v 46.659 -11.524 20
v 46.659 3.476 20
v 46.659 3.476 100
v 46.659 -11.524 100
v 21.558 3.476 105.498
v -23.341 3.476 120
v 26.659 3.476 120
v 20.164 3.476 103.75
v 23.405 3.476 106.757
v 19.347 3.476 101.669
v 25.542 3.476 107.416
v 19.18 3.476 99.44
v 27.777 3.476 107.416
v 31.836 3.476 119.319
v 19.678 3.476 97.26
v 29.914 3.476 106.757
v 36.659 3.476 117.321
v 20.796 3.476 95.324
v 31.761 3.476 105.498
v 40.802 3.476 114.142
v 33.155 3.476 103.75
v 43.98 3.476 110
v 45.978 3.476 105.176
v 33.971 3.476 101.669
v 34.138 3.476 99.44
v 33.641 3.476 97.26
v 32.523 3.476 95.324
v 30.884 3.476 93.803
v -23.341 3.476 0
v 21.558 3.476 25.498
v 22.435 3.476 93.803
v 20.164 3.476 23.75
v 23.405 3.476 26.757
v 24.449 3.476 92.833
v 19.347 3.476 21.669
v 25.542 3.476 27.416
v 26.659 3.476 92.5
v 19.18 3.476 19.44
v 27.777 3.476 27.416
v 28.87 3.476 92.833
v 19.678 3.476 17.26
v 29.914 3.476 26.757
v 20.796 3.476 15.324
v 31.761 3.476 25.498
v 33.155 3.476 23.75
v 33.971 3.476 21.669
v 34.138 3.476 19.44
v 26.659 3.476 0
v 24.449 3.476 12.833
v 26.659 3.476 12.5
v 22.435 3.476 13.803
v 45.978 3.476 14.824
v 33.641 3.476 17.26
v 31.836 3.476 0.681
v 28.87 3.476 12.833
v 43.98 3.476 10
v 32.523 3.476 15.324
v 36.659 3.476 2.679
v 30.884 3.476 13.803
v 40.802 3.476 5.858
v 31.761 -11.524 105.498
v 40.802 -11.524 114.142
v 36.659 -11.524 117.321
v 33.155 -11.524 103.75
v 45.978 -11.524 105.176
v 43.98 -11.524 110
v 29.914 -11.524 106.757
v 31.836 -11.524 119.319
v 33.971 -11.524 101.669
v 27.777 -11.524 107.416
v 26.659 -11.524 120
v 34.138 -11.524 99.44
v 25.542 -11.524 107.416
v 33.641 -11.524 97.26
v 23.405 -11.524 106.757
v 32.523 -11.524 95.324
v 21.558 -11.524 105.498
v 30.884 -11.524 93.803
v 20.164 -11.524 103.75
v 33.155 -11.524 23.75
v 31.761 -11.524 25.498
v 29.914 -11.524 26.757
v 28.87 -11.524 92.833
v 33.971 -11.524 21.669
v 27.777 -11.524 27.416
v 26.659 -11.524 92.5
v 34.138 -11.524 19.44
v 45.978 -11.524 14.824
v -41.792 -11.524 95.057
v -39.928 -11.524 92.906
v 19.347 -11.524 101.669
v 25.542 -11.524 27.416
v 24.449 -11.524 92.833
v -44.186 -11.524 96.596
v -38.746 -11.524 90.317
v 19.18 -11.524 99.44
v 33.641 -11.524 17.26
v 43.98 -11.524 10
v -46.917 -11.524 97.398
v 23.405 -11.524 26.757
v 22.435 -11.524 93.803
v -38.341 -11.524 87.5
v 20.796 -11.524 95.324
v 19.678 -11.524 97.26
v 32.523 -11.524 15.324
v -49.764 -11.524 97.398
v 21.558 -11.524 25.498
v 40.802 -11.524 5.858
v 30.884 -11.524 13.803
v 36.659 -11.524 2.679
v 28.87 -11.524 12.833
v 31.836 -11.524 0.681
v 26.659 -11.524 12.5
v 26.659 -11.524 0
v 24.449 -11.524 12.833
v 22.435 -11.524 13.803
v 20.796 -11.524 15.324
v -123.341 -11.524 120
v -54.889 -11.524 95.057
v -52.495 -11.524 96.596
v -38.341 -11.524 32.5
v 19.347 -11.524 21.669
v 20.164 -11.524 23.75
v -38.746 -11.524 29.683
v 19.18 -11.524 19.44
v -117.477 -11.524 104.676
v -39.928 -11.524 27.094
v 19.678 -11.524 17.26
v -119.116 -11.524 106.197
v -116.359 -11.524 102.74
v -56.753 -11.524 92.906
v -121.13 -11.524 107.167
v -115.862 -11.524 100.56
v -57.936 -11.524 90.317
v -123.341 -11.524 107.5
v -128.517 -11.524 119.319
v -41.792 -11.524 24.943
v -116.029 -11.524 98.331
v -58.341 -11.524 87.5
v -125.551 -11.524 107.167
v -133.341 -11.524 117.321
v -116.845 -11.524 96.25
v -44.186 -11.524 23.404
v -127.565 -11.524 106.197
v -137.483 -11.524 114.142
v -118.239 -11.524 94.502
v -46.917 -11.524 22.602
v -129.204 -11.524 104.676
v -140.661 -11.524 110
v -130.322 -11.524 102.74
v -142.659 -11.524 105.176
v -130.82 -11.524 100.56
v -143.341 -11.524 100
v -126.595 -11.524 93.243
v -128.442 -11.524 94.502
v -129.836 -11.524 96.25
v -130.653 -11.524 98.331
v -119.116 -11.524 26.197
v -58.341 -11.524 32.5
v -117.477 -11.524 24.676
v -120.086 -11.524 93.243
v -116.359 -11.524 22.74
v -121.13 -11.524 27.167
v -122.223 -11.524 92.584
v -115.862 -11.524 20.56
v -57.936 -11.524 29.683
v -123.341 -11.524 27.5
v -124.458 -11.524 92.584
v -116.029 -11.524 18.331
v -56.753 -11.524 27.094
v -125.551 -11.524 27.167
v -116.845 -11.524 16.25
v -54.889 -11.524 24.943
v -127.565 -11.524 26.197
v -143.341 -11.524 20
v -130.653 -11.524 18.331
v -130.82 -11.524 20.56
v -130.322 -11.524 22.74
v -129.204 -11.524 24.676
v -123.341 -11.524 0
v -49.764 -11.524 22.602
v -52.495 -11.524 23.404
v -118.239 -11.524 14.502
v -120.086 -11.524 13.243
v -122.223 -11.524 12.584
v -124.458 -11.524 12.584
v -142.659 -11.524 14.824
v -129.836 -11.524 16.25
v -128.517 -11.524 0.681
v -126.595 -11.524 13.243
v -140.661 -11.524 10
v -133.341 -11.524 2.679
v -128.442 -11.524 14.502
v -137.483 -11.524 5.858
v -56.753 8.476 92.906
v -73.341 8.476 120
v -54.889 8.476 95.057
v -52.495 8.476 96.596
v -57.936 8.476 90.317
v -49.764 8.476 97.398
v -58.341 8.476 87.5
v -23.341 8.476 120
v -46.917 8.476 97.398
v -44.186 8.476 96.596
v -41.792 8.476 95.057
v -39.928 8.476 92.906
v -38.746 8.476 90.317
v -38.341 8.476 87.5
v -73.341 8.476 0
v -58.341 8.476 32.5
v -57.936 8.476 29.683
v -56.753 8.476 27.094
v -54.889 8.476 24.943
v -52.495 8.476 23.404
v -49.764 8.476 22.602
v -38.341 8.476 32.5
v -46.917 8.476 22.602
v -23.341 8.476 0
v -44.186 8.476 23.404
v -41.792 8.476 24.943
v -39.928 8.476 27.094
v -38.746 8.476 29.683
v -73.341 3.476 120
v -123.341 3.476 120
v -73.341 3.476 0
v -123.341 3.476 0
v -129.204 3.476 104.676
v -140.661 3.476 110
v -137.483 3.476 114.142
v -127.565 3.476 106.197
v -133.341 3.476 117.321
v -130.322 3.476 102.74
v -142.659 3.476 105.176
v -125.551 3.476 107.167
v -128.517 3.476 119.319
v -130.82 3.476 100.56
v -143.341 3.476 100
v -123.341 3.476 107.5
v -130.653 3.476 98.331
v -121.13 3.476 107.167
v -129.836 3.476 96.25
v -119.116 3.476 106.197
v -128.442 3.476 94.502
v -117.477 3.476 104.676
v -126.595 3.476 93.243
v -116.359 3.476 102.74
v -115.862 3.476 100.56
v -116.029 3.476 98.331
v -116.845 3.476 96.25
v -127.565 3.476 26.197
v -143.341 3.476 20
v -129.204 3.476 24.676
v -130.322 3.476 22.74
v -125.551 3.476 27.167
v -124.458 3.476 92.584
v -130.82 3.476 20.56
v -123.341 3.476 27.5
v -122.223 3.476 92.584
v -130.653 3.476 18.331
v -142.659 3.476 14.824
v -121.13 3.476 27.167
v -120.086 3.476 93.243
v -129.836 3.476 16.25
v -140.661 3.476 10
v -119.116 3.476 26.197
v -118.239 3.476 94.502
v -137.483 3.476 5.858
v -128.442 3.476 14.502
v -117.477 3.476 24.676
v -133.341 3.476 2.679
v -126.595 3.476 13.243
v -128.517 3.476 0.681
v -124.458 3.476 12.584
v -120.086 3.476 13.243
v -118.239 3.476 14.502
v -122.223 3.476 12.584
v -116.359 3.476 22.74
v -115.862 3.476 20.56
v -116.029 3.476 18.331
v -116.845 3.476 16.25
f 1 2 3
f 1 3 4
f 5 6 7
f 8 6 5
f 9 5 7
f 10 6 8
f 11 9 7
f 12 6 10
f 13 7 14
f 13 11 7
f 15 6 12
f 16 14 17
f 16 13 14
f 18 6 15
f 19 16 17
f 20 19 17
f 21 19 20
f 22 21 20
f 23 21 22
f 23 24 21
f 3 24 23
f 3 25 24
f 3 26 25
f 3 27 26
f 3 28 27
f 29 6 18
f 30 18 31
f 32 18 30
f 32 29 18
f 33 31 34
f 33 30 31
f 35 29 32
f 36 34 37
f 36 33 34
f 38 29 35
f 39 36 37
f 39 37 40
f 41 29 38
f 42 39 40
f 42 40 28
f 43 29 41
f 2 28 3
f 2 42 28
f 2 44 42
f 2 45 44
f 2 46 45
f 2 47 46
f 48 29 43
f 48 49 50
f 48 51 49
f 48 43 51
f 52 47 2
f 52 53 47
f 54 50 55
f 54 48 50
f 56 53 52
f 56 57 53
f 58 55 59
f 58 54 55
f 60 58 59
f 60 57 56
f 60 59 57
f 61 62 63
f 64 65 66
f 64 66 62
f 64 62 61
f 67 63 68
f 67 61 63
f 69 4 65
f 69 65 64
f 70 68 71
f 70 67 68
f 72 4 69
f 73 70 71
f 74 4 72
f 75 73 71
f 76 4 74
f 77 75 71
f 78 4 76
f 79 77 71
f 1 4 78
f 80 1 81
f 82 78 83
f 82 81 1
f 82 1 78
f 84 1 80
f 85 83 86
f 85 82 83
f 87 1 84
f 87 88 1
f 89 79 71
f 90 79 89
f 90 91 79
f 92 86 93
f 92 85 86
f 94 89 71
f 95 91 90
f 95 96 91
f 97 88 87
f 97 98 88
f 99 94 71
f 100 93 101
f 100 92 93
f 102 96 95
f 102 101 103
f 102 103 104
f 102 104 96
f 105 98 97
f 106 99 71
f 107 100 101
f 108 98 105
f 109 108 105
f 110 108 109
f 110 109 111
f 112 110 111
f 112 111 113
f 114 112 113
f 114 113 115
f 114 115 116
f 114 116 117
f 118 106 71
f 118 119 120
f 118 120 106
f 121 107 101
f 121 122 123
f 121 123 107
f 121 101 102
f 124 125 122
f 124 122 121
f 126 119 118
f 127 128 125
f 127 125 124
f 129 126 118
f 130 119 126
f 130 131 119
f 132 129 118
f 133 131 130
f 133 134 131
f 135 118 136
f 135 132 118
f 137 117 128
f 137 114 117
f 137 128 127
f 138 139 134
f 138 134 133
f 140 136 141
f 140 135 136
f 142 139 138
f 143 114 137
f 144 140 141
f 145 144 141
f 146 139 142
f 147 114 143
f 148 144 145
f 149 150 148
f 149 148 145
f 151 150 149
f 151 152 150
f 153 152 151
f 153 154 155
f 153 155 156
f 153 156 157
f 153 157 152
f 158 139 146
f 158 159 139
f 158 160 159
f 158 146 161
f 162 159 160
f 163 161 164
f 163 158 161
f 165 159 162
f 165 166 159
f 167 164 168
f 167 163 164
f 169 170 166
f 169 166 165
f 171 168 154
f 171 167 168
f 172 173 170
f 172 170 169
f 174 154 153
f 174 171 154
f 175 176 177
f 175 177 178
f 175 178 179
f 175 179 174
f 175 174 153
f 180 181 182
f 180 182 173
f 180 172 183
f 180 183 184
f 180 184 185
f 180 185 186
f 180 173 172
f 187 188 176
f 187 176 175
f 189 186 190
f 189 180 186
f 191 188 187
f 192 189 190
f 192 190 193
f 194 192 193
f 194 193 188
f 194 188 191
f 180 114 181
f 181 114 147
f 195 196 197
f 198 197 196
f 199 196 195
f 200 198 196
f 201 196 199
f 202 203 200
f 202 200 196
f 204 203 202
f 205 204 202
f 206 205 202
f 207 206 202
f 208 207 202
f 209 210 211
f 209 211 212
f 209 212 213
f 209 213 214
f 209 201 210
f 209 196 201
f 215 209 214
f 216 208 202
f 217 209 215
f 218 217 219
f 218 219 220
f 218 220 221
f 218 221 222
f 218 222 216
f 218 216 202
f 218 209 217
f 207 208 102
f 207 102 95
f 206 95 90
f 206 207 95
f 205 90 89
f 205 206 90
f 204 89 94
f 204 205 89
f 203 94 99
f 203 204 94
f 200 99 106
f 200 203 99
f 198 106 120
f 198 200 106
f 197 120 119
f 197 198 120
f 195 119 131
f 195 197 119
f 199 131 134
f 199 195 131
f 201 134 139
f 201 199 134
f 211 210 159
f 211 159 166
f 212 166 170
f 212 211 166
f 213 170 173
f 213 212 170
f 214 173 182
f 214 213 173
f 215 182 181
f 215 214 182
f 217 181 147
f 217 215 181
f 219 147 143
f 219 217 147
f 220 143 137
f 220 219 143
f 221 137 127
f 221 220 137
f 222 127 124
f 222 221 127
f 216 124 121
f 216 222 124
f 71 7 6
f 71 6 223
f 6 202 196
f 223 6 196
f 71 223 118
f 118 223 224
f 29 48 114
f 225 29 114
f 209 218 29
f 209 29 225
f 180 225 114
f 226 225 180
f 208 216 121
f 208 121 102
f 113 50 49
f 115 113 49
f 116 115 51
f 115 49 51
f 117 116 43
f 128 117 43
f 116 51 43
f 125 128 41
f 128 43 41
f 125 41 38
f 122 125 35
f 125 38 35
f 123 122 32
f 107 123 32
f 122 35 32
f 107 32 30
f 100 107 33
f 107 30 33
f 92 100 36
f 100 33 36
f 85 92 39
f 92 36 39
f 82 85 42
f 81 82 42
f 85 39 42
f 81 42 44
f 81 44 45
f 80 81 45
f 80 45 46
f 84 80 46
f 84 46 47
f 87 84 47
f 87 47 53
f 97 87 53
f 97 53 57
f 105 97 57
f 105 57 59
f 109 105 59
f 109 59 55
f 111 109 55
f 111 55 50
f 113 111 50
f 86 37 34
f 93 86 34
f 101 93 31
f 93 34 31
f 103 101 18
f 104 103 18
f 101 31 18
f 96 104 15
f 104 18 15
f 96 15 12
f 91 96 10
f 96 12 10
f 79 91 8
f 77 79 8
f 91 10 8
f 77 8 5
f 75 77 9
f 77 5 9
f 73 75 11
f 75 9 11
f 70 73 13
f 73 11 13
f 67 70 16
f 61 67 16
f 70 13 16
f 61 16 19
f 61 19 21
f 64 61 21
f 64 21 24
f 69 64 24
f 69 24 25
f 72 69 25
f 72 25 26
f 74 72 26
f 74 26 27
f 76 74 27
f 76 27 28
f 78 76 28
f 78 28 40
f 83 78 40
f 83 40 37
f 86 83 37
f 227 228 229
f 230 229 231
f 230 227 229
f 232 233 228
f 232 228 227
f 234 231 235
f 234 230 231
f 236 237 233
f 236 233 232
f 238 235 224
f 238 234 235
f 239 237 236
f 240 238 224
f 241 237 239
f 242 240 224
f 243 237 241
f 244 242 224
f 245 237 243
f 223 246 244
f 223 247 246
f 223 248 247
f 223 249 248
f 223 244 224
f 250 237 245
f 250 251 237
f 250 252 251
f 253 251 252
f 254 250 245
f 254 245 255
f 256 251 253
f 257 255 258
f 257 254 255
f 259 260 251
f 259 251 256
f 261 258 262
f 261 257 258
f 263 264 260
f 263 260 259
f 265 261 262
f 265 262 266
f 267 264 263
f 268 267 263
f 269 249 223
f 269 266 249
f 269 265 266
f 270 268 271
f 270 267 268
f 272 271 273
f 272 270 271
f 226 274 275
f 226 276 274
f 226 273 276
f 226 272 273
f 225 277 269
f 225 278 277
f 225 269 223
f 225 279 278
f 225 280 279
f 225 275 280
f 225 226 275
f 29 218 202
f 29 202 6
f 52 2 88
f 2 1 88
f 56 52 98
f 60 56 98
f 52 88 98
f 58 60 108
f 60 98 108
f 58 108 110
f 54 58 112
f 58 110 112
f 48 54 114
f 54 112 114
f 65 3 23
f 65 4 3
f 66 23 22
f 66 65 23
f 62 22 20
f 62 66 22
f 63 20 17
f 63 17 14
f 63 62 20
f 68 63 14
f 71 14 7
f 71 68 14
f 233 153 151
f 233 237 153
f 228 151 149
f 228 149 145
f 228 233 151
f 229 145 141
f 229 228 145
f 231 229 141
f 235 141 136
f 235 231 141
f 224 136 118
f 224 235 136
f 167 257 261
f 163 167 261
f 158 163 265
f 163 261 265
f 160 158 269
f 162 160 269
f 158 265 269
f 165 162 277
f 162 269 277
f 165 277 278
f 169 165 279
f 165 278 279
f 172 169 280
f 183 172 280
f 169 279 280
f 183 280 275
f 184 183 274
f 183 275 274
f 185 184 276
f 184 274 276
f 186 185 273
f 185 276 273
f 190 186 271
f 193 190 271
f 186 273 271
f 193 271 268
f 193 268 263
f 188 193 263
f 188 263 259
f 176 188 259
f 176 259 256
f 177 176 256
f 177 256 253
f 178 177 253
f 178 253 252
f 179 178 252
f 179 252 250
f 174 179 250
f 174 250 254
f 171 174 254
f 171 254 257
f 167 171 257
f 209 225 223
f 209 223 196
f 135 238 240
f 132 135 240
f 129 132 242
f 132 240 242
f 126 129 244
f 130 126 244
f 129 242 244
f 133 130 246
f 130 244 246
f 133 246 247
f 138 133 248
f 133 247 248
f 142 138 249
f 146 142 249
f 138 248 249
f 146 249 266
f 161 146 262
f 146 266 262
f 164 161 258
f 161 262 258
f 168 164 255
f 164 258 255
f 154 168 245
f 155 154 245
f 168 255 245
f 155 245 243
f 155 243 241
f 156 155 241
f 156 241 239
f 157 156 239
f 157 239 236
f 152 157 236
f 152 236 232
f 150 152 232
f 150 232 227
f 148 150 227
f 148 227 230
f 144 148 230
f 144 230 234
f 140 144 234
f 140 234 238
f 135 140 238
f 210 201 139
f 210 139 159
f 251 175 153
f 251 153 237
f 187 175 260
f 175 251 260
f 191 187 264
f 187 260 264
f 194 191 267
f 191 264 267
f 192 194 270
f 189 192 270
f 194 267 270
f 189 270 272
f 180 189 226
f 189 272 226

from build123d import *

# Parameters (mm, degrees)
Y_KSEKLIK_EKSTR_ZYON1_DEPTH = 120
RADYUS1_R                   = 20
KES_EKSTR_ZYON1_DEPTH       = 189.006716398
IZIM3_R                     = 7.5
KES_EKSTR_ZYON2_DEPTH       = 188.540730005


with BuildPart() as part:
    # Çizim1 → Yükseklik-Ekstrüzyon1 (new body)
    with BuildSketch(Plane.XY):
        Polygon((-23.340592334, 3.475609756), (46.659407666, 3.475609756), (46.659407666, -11.524390244), (-143.340592334, -11.524390244), (-143.340592334, 3.475609756), (-73.340592334, 3.475609756), (-73.340592334, 8.475609756), (-23.340592334, 8.475609756), align=None)
    extrude(amount=Y_KSEKLIK_EKSTR_ZYON1_DEPTH)

    # Radyus1
    radyus1_edges = [part.edges().sort_by_distance(p)[0] for p in [
        (46.659407666, -4.024390244, 0),
        (-143.340592334, -4.024390244, 0),
        (46.659407666, -4.024390244, 120),
        (-143.340592334, -4.024390244, 120),
    ]]
    fillet(radyus1_edges, radius=RADYUS1_R)

    # Çizim2 → Kes-Ekstrüzyon1 (cut, through all)
    with BuildSketch(Plane(origin=(0, 8.475609756, 0), x_dir=(1, 0, 0), z_dir=(0, 1, 0))):
        with BuildLine():
            Line((-38.340592334, -32.5), (-38.340592334, -87.5))
            ThreePointArc((-38.340592334, -87.5), (-48.340592334, -97.5), (-58.340592334, -87.5))
            Line((-58.340592334, -87.5), (-58.340592334, -32.5))
            ThreePointArc((-58.340592334, -32.5), (-48.340592334, -22.5), (-38.340592334, -32.5))
        make_face()
    extrude(amount=-KES_EKSTR_ZYON1_DEPTH, mode=Mode.SUBTRACT)

    # Çizim3 → Kes-Ekstrüzyon2 (cut, through all)
    with BuildSketch(Plane(origin=(0, 3.475609756, 0), x_dir=(1, 0, 0), z_dir=(0, 1, 0))):
        with Locations(Location((-123.340592334, -20, 0), (0, 0, 270))):
            Circle(IZIM3_R)
        with Locations(Location((-123.340592334, -100, 0), (0, 0, 270))):
            Circle(IZIM3_R)
        with Locations(Location((26.659407666, -100, 0), (0, 0, 90))):
            Circle(IZIM3_R)
        with Locations(Location((26.659407666, -20, 0), (0, 0, 90))):
            Circle(IZIM3_R)
    extrude(amount=-KES_EKSTR_ZYON2_DEPTH, mode=Mode.SUBTRACT)


solid = part.part
